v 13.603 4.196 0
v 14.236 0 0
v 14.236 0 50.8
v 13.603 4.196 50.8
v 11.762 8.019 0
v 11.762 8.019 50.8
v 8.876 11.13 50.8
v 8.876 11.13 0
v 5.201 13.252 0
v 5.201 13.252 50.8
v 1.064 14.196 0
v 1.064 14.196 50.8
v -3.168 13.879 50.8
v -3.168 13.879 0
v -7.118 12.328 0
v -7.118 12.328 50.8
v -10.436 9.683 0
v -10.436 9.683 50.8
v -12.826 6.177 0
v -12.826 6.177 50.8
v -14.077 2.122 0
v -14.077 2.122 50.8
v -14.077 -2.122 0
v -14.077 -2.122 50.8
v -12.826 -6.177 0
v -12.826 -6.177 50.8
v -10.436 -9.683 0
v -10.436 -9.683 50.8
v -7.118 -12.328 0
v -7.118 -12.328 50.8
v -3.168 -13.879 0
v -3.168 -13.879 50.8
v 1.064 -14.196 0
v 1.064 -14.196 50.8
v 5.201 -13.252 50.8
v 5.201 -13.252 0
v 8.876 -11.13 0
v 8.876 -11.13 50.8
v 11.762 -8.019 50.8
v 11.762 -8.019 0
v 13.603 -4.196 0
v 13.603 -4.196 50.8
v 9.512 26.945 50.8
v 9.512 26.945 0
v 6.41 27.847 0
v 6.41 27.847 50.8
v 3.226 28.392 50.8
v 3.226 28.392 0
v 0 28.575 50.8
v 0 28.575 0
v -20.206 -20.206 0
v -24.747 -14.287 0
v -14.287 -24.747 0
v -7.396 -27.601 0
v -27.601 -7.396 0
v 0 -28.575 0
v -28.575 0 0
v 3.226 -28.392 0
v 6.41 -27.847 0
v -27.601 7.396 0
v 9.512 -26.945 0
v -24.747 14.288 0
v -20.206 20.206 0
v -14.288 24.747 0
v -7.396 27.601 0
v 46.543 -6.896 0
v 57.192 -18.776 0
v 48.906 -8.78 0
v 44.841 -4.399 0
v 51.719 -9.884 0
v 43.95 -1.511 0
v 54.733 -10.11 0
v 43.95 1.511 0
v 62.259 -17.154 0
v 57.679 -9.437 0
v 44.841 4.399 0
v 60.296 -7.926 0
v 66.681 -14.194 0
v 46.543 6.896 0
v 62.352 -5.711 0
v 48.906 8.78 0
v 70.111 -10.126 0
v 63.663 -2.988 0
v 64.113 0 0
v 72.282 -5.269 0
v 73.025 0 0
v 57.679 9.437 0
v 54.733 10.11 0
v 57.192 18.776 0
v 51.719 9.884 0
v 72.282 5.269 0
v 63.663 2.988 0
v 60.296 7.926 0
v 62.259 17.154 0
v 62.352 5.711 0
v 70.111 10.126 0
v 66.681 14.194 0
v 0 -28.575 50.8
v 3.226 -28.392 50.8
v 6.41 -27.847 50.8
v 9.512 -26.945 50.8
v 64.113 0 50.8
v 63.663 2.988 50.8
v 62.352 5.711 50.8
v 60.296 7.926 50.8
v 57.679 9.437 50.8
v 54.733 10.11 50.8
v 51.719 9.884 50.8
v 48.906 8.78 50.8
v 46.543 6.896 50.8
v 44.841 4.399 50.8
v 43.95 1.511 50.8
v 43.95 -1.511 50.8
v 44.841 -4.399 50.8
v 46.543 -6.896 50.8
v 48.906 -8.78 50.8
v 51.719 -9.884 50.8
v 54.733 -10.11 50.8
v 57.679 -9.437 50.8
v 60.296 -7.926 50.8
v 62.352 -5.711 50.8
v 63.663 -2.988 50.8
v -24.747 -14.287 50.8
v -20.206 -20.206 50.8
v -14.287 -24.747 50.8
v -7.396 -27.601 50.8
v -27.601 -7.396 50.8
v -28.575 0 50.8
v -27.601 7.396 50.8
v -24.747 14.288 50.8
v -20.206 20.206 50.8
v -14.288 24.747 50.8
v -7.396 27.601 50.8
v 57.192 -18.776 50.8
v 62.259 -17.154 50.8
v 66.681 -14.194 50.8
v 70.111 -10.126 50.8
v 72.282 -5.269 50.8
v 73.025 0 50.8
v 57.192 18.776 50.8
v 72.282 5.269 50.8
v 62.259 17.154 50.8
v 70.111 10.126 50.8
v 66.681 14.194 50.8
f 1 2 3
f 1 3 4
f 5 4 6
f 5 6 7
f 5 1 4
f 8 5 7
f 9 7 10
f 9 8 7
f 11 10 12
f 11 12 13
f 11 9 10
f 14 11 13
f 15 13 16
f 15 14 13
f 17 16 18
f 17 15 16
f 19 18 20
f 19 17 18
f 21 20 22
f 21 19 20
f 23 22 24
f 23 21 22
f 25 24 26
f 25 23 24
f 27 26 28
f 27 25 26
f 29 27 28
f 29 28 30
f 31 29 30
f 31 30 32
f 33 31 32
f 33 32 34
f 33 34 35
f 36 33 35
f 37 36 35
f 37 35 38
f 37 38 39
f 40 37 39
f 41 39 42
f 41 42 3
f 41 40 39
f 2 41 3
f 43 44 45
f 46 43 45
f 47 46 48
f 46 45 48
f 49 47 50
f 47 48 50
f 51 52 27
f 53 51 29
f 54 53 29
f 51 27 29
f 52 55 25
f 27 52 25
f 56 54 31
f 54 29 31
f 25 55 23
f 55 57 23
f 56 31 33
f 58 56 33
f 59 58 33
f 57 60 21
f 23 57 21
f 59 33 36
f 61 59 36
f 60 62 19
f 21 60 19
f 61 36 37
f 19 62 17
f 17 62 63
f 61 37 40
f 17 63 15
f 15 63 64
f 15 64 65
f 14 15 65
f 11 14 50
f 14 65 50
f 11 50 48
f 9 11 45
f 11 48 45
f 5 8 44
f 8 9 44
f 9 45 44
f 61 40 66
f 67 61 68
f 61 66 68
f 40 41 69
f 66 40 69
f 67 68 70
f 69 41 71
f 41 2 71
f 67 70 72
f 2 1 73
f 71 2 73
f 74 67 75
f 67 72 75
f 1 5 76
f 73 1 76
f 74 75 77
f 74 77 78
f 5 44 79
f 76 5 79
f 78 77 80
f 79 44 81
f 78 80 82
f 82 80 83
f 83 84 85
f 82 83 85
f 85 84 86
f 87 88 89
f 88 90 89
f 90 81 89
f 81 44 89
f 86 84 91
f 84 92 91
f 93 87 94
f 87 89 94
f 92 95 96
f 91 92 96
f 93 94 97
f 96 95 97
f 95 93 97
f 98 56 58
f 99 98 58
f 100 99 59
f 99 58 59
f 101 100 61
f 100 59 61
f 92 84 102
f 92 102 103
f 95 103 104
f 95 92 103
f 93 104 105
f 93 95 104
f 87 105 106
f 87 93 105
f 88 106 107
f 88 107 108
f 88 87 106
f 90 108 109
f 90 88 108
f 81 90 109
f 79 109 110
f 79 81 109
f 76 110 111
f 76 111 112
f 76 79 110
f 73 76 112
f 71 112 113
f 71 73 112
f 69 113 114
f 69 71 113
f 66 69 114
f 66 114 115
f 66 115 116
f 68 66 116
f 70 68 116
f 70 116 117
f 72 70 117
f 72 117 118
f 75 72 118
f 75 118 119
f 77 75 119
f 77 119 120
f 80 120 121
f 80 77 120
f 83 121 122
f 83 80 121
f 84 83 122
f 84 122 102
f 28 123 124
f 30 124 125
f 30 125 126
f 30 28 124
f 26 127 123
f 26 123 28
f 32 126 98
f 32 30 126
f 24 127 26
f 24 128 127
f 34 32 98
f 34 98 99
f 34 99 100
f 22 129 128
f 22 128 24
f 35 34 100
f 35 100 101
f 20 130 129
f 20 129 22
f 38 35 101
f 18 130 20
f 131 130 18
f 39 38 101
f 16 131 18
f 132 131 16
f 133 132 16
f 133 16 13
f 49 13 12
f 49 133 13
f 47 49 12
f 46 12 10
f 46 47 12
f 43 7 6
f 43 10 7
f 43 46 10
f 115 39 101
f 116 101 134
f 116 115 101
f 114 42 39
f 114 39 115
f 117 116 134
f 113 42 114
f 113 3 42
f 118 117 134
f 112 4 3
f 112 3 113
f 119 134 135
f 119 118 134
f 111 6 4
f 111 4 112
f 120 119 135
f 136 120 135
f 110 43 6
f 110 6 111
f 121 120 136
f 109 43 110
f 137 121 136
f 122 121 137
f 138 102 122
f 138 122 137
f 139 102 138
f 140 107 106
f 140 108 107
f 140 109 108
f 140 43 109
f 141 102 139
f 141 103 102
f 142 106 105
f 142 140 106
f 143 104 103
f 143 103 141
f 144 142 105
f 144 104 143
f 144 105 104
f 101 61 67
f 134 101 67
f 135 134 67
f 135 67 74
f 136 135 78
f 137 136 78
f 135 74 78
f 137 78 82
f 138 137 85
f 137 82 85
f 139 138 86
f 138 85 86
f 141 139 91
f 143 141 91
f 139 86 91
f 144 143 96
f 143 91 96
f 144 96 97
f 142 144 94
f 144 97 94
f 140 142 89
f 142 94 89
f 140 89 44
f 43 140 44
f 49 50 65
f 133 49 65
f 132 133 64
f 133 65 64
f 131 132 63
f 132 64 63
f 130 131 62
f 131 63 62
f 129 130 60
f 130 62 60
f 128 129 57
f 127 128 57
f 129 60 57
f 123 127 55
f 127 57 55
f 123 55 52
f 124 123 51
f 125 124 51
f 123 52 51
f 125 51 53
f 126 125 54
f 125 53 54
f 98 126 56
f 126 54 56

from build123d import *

# Parameters (mm, degrees)
F0_R     = 14.235704
F0_R_2   = 10.13824
F1_DEPTH = 50.8
F2_DEPTH = 114.046


with BuildPart() as f1:
    # F0 (on Top) → F1 (new body)
    with BuildSketch(Plane.XY):
        Circle(F0_R)
        with Locations((53.975, 0)):
            Circle(F0_R_2)
        with BuildLine():
            Line((57.191927, 18.776418), (9.512184, 26.945296))
            Line((9.512184, 26.945296), (0, 28.575))
            ThreePointArc((0, 28.575), (-28.575, 0), (0, -28.575))
            Line((0, -28.575), (9.512184, -26.945296))
            Line((9.512184, -26.945296), (57.191927, -18.776418))
            ThreePointArc((57.191927, -18.776418), (73.025, 0), (57.191927, 18.776418))
        make_face()
        Circle(F0_R, mode=Mode.SUBTRACT)
        with Locations((53.975, 0)):
            Circle(F0_R_2, mode=Mode.SUBTRACT)
        with BuildLine():
            Line((0, 28.575), (9.512184, 26.945296))
            ThreePointArc((9.512184, 26.945296), (4.825391, 28.164627), (0, 28.575))
        make_face()
        with BuildLine():
            Line((9.512184, -26.945296), (0, -28.575))
            ThreePointArc((0, -28.575), (4.825391, -28.164627), (9.512184, -26.945296))
        make_face()
    extrude(amount=F1_DEPTH)

    # F0 (on Top) → F2 (cut)
    with BuildSketch(Plane.XY):
        Circle(F0_R)
        with Locations((53.975, 0)):
            Circle(F0_R_2)
    extrude(amount=F2_DEPTH, mode=Mode.SUBTRACT)


solid = f1.part
